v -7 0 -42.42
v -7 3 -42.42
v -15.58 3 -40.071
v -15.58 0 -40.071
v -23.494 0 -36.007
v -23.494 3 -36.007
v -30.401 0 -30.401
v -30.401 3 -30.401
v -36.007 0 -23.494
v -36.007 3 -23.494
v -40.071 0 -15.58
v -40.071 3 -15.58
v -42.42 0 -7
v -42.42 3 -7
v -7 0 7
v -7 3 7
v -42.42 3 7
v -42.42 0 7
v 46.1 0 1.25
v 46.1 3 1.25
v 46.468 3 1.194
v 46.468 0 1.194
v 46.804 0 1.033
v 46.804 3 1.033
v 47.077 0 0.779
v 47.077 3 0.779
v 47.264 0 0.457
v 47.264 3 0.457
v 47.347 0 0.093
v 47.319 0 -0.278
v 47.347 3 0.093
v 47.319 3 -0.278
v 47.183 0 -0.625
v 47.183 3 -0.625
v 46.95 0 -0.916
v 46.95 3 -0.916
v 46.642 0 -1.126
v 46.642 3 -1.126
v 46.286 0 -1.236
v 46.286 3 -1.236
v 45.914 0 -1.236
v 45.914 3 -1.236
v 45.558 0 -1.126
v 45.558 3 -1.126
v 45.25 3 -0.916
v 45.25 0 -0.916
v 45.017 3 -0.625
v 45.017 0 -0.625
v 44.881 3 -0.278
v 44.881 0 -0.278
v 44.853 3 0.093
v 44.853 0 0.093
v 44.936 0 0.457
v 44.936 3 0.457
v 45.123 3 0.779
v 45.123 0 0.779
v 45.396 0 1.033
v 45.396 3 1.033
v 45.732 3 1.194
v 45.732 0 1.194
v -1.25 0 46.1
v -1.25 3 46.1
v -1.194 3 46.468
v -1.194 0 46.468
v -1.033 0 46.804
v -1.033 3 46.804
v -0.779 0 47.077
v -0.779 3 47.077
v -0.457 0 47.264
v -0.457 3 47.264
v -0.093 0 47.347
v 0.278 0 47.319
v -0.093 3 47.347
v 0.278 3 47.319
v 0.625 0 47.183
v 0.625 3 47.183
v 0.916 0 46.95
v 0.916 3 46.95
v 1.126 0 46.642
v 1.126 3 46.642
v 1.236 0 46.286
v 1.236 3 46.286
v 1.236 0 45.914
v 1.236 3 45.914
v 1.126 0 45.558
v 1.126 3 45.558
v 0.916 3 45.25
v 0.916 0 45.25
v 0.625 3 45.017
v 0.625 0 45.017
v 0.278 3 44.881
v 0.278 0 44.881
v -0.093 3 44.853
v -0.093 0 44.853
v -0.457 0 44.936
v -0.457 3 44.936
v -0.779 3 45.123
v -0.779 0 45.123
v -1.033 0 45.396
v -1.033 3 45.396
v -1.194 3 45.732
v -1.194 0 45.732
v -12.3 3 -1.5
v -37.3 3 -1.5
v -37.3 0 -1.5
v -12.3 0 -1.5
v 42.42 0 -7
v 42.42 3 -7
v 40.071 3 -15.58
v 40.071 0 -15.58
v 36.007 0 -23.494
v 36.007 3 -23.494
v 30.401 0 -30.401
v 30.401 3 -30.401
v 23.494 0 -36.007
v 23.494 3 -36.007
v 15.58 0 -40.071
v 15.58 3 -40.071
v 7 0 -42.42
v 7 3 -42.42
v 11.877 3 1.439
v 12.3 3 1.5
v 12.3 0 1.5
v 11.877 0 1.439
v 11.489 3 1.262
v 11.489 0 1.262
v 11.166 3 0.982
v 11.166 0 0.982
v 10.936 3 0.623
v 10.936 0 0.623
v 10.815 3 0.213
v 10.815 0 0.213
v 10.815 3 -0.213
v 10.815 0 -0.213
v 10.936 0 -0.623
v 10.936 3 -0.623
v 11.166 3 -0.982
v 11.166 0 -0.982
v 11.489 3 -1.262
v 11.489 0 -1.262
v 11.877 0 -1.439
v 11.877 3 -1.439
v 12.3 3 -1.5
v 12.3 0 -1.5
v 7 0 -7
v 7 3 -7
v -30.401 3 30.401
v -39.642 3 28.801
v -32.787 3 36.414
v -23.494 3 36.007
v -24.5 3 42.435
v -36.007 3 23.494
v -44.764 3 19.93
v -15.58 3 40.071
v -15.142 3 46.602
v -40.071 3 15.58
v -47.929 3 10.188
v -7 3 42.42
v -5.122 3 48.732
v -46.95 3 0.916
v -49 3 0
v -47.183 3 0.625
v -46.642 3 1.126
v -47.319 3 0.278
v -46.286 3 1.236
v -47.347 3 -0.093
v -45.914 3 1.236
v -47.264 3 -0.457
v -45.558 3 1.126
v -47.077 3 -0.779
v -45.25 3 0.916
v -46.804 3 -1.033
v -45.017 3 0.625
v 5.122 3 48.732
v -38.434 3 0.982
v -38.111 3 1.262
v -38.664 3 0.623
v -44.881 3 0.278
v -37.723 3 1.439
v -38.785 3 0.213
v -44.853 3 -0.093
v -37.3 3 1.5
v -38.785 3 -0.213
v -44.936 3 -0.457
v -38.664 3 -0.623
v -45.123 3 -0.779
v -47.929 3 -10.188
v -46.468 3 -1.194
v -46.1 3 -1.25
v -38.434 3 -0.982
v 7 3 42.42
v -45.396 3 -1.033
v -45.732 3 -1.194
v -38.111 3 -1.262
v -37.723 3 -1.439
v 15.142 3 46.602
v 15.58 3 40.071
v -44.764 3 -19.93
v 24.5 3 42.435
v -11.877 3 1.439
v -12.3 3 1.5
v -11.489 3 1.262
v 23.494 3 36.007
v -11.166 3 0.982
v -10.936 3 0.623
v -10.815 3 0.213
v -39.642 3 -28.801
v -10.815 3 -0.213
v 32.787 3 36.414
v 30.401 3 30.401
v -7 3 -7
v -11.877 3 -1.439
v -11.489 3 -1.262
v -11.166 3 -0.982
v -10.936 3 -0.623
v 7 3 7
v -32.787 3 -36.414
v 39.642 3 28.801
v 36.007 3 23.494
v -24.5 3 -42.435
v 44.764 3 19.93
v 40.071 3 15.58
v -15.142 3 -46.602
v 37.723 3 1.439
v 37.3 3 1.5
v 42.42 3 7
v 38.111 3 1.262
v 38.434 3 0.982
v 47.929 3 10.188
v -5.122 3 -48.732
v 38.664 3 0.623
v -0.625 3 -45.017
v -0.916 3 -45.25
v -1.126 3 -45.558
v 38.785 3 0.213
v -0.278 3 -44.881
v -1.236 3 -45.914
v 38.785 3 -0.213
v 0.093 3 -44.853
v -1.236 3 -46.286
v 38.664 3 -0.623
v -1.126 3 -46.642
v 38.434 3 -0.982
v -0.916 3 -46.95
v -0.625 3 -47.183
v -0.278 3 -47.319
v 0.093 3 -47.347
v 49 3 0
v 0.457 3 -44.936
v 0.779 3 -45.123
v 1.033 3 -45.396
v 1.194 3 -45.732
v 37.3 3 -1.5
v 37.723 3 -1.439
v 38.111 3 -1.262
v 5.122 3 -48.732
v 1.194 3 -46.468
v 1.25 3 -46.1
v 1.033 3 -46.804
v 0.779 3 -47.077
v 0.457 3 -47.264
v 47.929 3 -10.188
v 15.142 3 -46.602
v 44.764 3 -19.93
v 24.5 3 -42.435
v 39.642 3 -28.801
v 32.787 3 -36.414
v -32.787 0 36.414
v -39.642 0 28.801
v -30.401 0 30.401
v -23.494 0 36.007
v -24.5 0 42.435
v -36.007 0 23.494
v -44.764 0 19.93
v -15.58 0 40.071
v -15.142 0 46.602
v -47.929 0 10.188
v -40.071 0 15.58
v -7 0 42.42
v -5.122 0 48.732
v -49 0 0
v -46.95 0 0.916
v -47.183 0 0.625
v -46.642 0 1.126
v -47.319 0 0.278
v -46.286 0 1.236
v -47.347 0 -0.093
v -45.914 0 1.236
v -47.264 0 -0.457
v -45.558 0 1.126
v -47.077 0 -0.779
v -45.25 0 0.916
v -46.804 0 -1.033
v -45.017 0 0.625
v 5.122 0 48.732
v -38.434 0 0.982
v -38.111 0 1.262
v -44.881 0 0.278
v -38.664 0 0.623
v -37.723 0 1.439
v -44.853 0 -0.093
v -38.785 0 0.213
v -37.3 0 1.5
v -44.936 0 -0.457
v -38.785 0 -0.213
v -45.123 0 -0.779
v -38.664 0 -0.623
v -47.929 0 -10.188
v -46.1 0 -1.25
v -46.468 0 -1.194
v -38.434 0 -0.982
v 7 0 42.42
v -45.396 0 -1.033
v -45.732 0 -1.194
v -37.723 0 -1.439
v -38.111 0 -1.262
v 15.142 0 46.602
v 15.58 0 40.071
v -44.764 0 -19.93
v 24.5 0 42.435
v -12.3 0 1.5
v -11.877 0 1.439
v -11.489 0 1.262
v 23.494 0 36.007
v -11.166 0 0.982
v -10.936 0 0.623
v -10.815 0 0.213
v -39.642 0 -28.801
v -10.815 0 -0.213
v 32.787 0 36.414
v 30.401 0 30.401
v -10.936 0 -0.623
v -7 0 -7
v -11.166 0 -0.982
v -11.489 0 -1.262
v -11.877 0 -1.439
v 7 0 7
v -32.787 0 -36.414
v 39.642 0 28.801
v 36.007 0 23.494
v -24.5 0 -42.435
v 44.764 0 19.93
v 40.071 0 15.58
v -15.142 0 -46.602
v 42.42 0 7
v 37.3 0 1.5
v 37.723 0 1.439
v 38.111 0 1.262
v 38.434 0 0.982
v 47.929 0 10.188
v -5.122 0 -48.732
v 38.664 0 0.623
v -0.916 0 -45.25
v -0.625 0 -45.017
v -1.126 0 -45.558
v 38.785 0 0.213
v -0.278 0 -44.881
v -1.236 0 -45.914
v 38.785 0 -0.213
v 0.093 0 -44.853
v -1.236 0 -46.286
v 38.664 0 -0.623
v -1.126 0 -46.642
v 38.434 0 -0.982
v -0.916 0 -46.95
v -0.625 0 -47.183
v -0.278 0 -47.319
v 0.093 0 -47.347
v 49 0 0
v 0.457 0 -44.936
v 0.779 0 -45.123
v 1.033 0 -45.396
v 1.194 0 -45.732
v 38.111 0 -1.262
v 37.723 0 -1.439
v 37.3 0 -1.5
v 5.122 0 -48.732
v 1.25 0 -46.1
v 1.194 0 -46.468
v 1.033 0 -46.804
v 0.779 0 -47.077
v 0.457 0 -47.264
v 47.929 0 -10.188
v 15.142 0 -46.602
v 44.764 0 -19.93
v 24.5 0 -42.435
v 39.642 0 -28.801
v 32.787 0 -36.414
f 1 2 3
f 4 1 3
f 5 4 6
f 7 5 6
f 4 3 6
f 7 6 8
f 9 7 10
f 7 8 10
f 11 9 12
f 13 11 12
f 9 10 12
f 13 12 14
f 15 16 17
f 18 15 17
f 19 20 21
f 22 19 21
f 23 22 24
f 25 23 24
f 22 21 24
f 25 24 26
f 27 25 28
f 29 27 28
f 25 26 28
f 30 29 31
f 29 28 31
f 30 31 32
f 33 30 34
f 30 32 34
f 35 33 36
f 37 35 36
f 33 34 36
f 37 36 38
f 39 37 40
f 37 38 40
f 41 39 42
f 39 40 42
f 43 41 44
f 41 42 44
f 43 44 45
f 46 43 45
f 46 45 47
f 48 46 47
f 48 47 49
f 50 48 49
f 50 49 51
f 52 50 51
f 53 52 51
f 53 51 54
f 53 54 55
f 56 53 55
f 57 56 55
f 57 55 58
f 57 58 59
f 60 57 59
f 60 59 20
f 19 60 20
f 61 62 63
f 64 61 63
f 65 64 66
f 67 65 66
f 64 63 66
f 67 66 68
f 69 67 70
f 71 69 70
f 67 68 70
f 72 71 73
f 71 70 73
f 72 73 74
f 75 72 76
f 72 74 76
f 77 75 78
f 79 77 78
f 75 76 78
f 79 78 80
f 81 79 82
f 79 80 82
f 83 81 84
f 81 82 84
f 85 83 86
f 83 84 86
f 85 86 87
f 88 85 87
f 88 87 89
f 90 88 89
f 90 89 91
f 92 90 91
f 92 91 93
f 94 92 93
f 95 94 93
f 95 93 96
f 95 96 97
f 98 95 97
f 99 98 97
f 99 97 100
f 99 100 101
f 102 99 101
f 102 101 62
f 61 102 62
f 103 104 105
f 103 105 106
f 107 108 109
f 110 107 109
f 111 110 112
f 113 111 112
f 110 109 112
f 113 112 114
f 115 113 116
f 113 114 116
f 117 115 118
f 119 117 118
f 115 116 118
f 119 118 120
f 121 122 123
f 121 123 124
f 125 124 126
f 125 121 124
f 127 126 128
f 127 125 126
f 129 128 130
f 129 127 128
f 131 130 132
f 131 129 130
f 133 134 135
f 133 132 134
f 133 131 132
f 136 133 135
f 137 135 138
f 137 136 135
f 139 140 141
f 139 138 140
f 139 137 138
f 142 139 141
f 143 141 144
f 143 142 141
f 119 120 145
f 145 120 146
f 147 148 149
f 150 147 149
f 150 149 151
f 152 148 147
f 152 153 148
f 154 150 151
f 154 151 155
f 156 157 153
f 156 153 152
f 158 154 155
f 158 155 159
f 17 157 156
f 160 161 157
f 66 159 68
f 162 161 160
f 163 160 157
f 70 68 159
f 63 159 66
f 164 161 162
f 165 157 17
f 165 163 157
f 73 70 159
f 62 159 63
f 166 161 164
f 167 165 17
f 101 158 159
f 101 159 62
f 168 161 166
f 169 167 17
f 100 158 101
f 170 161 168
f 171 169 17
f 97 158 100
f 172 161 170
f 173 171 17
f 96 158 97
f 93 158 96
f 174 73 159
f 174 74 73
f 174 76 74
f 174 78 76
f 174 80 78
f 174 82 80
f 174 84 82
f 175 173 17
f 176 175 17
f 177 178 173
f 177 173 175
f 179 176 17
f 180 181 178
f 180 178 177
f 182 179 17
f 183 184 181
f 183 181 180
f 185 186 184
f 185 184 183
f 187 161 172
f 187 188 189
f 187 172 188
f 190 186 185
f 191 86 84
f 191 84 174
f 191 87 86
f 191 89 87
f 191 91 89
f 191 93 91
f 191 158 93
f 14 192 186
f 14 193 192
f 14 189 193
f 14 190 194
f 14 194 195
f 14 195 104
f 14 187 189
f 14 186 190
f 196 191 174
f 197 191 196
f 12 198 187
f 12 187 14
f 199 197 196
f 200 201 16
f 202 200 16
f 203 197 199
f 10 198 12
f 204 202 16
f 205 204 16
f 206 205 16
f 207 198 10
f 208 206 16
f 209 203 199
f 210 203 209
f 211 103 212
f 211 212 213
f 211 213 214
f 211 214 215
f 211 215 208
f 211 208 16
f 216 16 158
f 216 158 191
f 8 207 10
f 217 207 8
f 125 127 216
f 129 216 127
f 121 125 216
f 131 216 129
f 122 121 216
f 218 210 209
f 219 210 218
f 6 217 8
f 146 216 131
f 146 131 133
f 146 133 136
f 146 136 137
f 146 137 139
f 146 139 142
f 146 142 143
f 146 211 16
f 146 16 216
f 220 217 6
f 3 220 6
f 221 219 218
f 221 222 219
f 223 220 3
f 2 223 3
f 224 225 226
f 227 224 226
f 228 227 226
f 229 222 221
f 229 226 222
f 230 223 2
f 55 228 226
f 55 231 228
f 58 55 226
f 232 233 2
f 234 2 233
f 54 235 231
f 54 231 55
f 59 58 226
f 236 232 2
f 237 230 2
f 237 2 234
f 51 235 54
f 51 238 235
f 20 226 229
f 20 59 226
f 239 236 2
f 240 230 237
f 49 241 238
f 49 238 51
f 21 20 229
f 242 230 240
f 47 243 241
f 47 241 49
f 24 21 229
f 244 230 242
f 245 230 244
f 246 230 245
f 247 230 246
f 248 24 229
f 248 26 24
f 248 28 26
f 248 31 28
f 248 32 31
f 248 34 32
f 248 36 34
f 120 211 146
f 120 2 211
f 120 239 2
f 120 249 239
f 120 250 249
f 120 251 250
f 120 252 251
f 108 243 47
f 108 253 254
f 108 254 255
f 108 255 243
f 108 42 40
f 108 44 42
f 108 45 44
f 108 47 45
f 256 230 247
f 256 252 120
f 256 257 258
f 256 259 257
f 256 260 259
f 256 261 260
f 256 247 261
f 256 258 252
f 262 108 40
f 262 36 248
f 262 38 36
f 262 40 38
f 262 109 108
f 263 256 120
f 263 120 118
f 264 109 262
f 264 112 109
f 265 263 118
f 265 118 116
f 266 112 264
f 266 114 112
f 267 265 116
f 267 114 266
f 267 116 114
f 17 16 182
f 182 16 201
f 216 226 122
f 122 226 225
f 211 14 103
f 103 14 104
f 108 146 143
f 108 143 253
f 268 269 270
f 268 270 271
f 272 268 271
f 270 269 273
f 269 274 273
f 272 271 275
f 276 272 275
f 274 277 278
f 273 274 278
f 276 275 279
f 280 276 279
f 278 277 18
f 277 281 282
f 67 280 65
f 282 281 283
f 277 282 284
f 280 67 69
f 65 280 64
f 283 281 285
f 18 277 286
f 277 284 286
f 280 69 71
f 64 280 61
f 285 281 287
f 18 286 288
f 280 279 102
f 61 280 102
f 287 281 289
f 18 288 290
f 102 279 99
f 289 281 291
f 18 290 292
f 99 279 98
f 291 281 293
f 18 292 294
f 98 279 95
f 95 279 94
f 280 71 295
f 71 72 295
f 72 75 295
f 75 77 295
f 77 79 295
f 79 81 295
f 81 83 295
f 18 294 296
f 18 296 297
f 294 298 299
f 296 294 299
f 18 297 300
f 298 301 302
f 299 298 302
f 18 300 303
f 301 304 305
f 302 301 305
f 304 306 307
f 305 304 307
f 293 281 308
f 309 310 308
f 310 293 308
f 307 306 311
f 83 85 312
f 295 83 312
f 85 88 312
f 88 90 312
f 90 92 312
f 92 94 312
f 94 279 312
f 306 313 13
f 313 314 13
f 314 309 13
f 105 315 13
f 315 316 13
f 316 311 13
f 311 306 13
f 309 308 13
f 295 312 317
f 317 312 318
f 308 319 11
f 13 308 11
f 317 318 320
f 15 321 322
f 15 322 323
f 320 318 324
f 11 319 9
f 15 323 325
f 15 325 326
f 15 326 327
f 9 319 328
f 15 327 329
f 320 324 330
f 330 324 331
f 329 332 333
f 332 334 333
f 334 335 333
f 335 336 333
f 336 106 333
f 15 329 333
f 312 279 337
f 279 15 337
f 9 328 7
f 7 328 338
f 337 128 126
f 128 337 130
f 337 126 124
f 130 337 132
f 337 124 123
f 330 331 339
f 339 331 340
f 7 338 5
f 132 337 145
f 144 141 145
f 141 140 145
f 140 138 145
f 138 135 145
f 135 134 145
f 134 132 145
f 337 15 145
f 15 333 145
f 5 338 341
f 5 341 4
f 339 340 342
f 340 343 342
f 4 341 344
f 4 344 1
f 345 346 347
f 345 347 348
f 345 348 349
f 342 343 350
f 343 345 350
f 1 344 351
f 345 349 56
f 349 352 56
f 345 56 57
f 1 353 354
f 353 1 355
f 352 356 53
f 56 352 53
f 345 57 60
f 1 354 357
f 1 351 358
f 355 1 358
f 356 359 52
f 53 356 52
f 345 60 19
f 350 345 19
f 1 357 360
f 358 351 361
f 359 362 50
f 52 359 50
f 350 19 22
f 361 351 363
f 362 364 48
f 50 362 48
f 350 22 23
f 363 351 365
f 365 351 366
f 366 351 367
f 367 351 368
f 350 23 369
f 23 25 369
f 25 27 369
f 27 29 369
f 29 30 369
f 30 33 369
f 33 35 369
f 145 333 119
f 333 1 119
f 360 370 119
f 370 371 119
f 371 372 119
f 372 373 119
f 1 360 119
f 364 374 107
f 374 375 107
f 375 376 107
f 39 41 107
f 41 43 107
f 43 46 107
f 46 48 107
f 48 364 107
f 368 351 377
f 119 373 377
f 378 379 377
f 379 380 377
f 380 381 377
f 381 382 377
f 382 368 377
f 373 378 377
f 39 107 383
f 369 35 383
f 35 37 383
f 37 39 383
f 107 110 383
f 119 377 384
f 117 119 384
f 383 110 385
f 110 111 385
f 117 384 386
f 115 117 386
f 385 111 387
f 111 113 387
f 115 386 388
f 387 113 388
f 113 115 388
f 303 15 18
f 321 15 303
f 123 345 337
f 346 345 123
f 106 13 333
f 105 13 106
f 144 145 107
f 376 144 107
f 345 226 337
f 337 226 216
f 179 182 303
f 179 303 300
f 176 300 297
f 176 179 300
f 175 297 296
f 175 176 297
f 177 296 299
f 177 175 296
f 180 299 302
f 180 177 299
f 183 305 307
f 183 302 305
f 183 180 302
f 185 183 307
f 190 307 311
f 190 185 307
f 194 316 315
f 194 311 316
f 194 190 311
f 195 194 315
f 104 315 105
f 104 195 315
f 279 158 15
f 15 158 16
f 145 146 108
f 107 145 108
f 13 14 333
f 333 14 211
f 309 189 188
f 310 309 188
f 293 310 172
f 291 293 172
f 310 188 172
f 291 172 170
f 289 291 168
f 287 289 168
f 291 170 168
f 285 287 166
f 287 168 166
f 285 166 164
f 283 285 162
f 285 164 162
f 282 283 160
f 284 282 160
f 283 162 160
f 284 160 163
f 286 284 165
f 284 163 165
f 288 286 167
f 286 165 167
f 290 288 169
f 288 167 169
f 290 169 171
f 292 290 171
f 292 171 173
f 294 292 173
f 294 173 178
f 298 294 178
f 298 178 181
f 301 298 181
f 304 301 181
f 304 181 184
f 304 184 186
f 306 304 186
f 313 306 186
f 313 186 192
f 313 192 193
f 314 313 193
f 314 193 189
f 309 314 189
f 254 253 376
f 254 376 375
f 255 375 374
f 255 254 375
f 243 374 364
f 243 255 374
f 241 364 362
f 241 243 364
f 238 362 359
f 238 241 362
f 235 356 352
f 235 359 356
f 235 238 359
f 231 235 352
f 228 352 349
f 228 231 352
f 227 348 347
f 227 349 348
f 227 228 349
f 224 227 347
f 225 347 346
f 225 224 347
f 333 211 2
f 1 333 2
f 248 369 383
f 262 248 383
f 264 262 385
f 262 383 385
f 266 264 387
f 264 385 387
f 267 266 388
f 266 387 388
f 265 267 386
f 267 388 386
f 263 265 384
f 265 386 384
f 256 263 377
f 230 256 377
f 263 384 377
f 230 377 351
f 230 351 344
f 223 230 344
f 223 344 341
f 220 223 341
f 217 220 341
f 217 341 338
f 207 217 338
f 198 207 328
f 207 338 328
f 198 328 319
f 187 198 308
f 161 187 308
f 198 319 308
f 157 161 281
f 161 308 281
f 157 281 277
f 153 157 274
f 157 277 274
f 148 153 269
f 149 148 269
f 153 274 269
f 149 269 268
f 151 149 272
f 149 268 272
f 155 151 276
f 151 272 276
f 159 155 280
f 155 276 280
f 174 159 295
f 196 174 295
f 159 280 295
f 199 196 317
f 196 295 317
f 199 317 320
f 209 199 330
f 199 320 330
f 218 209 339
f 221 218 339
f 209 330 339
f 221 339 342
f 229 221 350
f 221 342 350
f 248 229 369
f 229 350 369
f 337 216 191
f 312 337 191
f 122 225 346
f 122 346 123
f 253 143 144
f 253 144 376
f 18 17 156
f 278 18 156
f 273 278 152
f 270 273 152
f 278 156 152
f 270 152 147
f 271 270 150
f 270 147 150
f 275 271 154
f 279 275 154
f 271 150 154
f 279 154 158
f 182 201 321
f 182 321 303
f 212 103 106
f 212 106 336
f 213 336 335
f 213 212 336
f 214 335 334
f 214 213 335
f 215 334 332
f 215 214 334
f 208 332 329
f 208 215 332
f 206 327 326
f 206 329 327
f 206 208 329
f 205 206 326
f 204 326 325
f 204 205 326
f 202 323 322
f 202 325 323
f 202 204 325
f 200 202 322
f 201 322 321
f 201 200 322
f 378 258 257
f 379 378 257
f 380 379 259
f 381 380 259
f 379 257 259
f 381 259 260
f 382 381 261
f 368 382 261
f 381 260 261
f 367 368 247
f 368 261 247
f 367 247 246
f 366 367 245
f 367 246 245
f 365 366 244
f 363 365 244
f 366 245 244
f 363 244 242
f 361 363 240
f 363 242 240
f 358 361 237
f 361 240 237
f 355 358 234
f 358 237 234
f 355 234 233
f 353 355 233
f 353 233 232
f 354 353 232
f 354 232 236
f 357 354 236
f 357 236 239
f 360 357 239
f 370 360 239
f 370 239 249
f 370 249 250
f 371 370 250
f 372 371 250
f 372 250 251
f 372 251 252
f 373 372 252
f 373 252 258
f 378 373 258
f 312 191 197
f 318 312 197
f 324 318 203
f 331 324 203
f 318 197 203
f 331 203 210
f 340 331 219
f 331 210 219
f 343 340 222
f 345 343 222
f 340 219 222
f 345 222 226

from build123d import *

# Parameters (mm, degrees)
SKETCH_1_R               = 49
EXTRUDE_1_DEPTH          = 3
CUT_EXTRUDE_3_DEPTH      = 4
CUT_EXTRUDE_4_DEPTH      = 4
PATTERN_CIRCULAR_4_COUNT = 2
SKETCH_2_R               = 1.25
CUT_EXTRUDE_5_DEPTH      = 4
PATTERN_CIRCULAR_5_COUNT = 4
PATTERN_CIRCULAR_6_COUNT = 4


with BuildPart() as part:
    # 草图1 → 凸台-拉伸1 (new body)
    with BuildSketch(Plane(origin=(0, 0, 0), x_dir=(1, 0, 0), z_dir=(0, 1, 0))):
        Circle(SKETCH_1_R)
    extrude(amount=EXTRUDE_1_DEPTH)

    # 草图5 → 切除-拉伸3 (cut, through all)
    with BuildSketch(Plane(origin=(0, 3, 0), x_dir=(1, 0, 0), z_dir=(0, 1, 0))):
        with BuildLine():
            Line((7, 42.420036355), (7, 7))
            Line((7, 7), (42.420036355, 7))
            ThreePointArc((42.420036355, 7), (30.401147054, 30.401147054), (7, 42.420036355))
        make_face()
    cut_extrude_3 = extrude(amount=-CUT_EXTRUDE_3_DEPTH, mode=Mode.SUBTRACT)

    # 草图6 → 切除-拉伸4 (cut, through all)
    with BuildSketch(Plane(origin=(0, 3, 0), x_dir=(1, 0, 0), z_dir=(0, 1, 0))):
        with BuildLine():
            Line((-12.3, -1.5), (-37.3, -1.5))
            ThreePointArc((-37.3, -1.5), (-38.8, 0), (-37.3, 1.5))
            Line((-37.3, 1.5), (-12.3, 1.5))
            ThreePointArc((-12.3, 1.5), (-10.8, 0), (-12.3, -1.5))
        make_face()
    cut_extrude_4 = extrude(amount=-CUT_EXTRUDE_4_DEPTH, mode=Mode.SUBTRACT)

    # 阵列(圆周)4: 切除-拉伸4 ×2 about axis
    pattern_circular_4_axis = Axis((0, 0, 0), (0, 1, 0))
    for i in range(1, PATTERN_CIRCULAR_4_COUNT):
        add(cut_extrude_4.rotate(pattern_circular_4_axis, i * 360 / PATTERN_CIRCULAR_4_COUNT), mode=Mode.SUBTRACT)

    # 草图2 → 切除-拉伸5 (cut, through all)
    with BuildSketch(Plane(origin=(0, 3, 0), x_dir=(1, 0, 0), z_dir=(0, 1, 0))):
        with Locations((0, 46.1)):
            Circle(SKETCH_2_R)
    cut_extrude_5 = extrude(amount=-CUT_EXTRUDE_5_DEPTH, mode=Mode.SUBTRACT)

    # 阵列(圆周)5: 切除-拉伸5 ×4 about axis
    pattern_circular_5_axis = Axis((0, 0, 0), (0, 1, 0))
    for i in range(1, PATTERN_CIRCULAR_5_COUNT):
        add(cut_extrude_5.rotate(pattern_circular_5_axis, i * 360 / PATTERN_CIRCULAR_5_COUNT), mode=Mode.SUBTRACT)

    # 阵列(圆周)6: 切除-拉伸3 ×4 about axis
    pattern_circular_6_axis = Axis((0, 0, 0), (0, 1, 0))
    for i in range(1, PATTERN_CIRCULAR_6_COUNT):
        add(cut_extrude_3.rotate(pattern_circular_6_axis, i * 360 / PATTERN_CIRCULAR_6_COUNT), mode=Mode.SUBTRACT)


solid = part.part
